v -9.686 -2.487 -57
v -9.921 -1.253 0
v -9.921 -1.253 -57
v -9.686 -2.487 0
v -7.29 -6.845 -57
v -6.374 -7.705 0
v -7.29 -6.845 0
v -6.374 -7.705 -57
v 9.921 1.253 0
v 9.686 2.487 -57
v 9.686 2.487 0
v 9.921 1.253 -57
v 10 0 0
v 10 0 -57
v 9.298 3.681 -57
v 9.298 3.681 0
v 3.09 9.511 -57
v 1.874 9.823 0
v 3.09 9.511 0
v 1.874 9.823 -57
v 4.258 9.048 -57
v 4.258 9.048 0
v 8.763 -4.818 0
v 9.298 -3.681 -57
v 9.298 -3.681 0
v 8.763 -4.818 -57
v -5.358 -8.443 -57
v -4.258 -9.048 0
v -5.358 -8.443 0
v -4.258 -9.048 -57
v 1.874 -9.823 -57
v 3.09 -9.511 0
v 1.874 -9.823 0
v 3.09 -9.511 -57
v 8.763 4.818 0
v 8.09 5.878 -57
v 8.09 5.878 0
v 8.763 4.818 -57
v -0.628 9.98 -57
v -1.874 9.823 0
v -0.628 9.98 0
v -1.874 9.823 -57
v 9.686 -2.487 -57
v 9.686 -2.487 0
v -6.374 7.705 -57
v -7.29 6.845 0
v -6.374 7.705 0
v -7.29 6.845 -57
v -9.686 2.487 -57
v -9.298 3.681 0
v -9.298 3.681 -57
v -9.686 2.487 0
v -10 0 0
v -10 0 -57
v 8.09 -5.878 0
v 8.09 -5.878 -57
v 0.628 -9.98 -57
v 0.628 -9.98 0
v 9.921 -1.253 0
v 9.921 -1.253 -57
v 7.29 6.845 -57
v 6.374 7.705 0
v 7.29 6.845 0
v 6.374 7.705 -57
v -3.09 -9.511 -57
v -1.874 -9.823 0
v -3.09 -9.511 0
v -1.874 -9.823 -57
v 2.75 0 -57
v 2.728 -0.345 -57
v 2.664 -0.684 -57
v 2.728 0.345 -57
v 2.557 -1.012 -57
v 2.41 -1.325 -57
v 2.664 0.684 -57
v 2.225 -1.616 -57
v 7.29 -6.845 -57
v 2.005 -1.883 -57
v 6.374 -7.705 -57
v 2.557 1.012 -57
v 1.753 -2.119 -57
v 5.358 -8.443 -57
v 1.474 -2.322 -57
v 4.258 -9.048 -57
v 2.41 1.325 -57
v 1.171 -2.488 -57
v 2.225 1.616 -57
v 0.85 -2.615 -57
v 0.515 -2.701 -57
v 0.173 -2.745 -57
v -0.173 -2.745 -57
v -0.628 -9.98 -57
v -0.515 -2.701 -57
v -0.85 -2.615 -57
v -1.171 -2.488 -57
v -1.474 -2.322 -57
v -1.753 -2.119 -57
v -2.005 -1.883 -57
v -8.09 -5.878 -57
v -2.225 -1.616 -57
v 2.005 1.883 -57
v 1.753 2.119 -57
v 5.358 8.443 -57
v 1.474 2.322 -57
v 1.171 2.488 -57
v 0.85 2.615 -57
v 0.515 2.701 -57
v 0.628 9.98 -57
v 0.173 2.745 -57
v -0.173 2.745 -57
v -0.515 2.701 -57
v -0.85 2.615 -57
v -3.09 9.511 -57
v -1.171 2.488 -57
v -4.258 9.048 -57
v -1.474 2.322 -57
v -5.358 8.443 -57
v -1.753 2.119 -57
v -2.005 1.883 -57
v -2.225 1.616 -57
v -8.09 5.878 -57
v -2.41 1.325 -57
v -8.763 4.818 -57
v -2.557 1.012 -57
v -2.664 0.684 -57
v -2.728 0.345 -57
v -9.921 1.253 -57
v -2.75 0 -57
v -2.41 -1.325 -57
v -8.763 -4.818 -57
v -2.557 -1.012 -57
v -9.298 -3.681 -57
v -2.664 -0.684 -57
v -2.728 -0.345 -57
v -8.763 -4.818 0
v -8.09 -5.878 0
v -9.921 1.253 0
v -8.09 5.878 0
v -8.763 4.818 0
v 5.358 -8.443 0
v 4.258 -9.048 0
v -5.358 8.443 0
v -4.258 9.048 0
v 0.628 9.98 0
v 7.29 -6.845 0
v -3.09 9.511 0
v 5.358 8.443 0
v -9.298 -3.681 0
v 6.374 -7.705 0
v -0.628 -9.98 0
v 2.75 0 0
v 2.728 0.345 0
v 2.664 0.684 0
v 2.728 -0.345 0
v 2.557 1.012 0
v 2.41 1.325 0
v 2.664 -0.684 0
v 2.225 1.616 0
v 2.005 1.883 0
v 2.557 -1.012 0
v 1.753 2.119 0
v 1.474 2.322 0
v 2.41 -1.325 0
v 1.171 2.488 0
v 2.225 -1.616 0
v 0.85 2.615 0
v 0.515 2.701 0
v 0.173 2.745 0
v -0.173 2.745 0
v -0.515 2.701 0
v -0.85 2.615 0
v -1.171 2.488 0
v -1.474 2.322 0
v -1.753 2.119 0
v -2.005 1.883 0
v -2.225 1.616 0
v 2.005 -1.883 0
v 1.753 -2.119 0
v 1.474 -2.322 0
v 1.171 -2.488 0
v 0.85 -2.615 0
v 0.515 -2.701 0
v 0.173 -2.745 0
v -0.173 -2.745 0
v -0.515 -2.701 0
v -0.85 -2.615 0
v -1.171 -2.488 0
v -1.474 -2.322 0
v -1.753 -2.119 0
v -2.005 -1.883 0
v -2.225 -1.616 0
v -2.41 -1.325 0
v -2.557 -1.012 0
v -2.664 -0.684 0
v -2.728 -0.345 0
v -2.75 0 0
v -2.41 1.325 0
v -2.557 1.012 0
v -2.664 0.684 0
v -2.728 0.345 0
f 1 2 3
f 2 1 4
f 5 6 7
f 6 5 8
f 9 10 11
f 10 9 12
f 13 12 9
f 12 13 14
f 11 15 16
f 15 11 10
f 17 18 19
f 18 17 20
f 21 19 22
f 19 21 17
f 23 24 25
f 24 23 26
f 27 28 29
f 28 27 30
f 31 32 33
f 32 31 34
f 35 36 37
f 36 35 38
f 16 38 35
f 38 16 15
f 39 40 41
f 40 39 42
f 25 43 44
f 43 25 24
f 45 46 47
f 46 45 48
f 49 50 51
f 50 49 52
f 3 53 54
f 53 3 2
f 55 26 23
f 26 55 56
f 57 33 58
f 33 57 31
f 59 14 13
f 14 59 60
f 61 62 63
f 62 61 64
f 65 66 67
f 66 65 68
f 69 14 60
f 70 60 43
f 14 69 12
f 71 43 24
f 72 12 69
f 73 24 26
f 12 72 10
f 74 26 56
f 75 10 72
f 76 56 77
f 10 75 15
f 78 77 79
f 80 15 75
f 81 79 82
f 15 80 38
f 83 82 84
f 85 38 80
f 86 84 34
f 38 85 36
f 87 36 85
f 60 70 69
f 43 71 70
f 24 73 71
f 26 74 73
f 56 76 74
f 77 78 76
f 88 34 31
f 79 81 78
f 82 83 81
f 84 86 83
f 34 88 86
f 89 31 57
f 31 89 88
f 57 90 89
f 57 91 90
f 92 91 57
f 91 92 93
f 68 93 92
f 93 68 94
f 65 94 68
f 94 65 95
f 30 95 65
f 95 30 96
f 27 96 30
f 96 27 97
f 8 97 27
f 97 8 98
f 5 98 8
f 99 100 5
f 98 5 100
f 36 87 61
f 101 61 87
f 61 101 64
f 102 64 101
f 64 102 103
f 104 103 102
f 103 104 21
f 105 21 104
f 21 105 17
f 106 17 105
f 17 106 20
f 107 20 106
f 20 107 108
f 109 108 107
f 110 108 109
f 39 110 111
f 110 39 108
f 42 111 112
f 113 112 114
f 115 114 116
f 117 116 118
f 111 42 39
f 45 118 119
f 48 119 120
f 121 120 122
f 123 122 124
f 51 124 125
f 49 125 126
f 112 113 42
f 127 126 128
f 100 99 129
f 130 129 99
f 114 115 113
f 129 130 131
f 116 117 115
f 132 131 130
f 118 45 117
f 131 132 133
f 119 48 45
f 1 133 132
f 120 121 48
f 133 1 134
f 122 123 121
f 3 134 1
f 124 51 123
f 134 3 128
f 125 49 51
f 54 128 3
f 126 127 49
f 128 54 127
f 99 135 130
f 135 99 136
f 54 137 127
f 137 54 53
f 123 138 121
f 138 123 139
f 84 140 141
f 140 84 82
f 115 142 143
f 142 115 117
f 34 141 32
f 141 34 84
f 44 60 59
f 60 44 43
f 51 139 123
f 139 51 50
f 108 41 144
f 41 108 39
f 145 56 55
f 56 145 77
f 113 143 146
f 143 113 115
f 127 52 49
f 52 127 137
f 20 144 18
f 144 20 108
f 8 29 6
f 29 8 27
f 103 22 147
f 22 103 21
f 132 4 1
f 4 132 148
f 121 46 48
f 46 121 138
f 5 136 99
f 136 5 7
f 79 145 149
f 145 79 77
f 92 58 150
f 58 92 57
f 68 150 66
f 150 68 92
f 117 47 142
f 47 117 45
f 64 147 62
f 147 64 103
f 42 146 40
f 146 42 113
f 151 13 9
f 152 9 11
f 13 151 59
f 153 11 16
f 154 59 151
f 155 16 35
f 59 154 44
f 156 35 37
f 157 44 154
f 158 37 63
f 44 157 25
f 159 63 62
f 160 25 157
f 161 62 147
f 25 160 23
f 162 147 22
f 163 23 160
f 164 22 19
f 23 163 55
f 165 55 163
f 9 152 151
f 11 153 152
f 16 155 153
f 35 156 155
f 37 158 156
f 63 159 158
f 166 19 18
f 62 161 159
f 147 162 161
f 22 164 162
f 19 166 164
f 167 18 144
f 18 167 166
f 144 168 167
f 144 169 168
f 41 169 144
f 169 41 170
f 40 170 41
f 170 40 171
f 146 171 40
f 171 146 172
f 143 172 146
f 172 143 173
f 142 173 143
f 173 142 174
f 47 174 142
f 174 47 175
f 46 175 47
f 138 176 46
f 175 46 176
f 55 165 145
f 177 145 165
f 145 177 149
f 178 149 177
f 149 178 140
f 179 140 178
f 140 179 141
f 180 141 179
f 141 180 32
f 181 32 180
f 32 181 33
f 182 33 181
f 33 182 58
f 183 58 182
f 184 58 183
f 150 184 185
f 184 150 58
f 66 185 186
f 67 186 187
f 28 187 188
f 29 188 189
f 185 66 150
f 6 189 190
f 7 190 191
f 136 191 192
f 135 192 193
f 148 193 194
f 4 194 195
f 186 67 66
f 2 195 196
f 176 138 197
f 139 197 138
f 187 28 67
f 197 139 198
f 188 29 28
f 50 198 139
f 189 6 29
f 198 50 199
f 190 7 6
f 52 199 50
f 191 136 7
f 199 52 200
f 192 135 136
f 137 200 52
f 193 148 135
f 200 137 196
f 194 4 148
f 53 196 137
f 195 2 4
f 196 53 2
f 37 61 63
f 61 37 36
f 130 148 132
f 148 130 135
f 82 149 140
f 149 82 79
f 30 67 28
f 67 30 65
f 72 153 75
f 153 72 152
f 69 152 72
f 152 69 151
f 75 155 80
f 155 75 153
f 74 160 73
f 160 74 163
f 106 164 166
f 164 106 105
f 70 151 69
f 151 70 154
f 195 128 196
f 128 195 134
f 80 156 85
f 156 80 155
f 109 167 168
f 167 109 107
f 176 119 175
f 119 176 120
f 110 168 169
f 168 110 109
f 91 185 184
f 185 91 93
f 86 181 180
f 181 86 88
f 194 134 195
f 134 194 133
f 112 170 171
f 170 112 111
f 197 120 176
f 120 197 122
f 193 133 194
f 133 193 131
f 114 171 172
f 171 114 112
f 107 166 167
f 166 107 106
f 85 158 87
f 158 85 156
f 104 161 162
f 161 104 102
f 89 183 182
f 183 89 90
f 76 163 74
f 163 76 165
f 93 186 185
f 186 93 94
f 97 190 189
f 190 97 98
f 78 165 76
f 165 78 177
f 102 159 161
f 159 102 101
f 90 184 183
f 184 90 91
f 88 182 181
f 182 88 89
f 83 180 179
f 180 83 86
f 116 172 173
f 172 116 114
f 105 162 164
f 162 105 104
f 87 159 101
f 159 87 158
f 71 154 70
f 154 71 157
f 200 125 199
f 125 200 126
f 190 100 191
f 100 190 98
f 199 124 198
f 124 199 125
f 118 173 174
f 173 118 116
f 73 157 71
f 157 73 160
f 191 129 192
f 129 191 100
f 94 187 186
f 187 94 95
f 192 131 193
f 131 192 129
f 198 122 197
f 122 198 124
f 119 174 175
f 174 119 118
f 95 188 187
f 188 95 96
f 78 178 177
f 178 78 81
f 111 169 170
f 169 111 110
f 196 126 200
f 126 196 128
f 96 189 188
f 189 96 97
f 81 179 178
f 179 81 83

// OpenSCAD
$fn = 50;


difference() {
	union() {
		translate(v = [0, 0, -57.0000000000]) {
			cylinder(h = 57, r = 10.0000000000);
		}
		cylinder(h = 0, r = 13.0000000000);
	}
	union() {
		#translate(v = [0, 0, -57]) {
			cylinder(h = 57, r = 2.7500000000);
		}
	}
}
